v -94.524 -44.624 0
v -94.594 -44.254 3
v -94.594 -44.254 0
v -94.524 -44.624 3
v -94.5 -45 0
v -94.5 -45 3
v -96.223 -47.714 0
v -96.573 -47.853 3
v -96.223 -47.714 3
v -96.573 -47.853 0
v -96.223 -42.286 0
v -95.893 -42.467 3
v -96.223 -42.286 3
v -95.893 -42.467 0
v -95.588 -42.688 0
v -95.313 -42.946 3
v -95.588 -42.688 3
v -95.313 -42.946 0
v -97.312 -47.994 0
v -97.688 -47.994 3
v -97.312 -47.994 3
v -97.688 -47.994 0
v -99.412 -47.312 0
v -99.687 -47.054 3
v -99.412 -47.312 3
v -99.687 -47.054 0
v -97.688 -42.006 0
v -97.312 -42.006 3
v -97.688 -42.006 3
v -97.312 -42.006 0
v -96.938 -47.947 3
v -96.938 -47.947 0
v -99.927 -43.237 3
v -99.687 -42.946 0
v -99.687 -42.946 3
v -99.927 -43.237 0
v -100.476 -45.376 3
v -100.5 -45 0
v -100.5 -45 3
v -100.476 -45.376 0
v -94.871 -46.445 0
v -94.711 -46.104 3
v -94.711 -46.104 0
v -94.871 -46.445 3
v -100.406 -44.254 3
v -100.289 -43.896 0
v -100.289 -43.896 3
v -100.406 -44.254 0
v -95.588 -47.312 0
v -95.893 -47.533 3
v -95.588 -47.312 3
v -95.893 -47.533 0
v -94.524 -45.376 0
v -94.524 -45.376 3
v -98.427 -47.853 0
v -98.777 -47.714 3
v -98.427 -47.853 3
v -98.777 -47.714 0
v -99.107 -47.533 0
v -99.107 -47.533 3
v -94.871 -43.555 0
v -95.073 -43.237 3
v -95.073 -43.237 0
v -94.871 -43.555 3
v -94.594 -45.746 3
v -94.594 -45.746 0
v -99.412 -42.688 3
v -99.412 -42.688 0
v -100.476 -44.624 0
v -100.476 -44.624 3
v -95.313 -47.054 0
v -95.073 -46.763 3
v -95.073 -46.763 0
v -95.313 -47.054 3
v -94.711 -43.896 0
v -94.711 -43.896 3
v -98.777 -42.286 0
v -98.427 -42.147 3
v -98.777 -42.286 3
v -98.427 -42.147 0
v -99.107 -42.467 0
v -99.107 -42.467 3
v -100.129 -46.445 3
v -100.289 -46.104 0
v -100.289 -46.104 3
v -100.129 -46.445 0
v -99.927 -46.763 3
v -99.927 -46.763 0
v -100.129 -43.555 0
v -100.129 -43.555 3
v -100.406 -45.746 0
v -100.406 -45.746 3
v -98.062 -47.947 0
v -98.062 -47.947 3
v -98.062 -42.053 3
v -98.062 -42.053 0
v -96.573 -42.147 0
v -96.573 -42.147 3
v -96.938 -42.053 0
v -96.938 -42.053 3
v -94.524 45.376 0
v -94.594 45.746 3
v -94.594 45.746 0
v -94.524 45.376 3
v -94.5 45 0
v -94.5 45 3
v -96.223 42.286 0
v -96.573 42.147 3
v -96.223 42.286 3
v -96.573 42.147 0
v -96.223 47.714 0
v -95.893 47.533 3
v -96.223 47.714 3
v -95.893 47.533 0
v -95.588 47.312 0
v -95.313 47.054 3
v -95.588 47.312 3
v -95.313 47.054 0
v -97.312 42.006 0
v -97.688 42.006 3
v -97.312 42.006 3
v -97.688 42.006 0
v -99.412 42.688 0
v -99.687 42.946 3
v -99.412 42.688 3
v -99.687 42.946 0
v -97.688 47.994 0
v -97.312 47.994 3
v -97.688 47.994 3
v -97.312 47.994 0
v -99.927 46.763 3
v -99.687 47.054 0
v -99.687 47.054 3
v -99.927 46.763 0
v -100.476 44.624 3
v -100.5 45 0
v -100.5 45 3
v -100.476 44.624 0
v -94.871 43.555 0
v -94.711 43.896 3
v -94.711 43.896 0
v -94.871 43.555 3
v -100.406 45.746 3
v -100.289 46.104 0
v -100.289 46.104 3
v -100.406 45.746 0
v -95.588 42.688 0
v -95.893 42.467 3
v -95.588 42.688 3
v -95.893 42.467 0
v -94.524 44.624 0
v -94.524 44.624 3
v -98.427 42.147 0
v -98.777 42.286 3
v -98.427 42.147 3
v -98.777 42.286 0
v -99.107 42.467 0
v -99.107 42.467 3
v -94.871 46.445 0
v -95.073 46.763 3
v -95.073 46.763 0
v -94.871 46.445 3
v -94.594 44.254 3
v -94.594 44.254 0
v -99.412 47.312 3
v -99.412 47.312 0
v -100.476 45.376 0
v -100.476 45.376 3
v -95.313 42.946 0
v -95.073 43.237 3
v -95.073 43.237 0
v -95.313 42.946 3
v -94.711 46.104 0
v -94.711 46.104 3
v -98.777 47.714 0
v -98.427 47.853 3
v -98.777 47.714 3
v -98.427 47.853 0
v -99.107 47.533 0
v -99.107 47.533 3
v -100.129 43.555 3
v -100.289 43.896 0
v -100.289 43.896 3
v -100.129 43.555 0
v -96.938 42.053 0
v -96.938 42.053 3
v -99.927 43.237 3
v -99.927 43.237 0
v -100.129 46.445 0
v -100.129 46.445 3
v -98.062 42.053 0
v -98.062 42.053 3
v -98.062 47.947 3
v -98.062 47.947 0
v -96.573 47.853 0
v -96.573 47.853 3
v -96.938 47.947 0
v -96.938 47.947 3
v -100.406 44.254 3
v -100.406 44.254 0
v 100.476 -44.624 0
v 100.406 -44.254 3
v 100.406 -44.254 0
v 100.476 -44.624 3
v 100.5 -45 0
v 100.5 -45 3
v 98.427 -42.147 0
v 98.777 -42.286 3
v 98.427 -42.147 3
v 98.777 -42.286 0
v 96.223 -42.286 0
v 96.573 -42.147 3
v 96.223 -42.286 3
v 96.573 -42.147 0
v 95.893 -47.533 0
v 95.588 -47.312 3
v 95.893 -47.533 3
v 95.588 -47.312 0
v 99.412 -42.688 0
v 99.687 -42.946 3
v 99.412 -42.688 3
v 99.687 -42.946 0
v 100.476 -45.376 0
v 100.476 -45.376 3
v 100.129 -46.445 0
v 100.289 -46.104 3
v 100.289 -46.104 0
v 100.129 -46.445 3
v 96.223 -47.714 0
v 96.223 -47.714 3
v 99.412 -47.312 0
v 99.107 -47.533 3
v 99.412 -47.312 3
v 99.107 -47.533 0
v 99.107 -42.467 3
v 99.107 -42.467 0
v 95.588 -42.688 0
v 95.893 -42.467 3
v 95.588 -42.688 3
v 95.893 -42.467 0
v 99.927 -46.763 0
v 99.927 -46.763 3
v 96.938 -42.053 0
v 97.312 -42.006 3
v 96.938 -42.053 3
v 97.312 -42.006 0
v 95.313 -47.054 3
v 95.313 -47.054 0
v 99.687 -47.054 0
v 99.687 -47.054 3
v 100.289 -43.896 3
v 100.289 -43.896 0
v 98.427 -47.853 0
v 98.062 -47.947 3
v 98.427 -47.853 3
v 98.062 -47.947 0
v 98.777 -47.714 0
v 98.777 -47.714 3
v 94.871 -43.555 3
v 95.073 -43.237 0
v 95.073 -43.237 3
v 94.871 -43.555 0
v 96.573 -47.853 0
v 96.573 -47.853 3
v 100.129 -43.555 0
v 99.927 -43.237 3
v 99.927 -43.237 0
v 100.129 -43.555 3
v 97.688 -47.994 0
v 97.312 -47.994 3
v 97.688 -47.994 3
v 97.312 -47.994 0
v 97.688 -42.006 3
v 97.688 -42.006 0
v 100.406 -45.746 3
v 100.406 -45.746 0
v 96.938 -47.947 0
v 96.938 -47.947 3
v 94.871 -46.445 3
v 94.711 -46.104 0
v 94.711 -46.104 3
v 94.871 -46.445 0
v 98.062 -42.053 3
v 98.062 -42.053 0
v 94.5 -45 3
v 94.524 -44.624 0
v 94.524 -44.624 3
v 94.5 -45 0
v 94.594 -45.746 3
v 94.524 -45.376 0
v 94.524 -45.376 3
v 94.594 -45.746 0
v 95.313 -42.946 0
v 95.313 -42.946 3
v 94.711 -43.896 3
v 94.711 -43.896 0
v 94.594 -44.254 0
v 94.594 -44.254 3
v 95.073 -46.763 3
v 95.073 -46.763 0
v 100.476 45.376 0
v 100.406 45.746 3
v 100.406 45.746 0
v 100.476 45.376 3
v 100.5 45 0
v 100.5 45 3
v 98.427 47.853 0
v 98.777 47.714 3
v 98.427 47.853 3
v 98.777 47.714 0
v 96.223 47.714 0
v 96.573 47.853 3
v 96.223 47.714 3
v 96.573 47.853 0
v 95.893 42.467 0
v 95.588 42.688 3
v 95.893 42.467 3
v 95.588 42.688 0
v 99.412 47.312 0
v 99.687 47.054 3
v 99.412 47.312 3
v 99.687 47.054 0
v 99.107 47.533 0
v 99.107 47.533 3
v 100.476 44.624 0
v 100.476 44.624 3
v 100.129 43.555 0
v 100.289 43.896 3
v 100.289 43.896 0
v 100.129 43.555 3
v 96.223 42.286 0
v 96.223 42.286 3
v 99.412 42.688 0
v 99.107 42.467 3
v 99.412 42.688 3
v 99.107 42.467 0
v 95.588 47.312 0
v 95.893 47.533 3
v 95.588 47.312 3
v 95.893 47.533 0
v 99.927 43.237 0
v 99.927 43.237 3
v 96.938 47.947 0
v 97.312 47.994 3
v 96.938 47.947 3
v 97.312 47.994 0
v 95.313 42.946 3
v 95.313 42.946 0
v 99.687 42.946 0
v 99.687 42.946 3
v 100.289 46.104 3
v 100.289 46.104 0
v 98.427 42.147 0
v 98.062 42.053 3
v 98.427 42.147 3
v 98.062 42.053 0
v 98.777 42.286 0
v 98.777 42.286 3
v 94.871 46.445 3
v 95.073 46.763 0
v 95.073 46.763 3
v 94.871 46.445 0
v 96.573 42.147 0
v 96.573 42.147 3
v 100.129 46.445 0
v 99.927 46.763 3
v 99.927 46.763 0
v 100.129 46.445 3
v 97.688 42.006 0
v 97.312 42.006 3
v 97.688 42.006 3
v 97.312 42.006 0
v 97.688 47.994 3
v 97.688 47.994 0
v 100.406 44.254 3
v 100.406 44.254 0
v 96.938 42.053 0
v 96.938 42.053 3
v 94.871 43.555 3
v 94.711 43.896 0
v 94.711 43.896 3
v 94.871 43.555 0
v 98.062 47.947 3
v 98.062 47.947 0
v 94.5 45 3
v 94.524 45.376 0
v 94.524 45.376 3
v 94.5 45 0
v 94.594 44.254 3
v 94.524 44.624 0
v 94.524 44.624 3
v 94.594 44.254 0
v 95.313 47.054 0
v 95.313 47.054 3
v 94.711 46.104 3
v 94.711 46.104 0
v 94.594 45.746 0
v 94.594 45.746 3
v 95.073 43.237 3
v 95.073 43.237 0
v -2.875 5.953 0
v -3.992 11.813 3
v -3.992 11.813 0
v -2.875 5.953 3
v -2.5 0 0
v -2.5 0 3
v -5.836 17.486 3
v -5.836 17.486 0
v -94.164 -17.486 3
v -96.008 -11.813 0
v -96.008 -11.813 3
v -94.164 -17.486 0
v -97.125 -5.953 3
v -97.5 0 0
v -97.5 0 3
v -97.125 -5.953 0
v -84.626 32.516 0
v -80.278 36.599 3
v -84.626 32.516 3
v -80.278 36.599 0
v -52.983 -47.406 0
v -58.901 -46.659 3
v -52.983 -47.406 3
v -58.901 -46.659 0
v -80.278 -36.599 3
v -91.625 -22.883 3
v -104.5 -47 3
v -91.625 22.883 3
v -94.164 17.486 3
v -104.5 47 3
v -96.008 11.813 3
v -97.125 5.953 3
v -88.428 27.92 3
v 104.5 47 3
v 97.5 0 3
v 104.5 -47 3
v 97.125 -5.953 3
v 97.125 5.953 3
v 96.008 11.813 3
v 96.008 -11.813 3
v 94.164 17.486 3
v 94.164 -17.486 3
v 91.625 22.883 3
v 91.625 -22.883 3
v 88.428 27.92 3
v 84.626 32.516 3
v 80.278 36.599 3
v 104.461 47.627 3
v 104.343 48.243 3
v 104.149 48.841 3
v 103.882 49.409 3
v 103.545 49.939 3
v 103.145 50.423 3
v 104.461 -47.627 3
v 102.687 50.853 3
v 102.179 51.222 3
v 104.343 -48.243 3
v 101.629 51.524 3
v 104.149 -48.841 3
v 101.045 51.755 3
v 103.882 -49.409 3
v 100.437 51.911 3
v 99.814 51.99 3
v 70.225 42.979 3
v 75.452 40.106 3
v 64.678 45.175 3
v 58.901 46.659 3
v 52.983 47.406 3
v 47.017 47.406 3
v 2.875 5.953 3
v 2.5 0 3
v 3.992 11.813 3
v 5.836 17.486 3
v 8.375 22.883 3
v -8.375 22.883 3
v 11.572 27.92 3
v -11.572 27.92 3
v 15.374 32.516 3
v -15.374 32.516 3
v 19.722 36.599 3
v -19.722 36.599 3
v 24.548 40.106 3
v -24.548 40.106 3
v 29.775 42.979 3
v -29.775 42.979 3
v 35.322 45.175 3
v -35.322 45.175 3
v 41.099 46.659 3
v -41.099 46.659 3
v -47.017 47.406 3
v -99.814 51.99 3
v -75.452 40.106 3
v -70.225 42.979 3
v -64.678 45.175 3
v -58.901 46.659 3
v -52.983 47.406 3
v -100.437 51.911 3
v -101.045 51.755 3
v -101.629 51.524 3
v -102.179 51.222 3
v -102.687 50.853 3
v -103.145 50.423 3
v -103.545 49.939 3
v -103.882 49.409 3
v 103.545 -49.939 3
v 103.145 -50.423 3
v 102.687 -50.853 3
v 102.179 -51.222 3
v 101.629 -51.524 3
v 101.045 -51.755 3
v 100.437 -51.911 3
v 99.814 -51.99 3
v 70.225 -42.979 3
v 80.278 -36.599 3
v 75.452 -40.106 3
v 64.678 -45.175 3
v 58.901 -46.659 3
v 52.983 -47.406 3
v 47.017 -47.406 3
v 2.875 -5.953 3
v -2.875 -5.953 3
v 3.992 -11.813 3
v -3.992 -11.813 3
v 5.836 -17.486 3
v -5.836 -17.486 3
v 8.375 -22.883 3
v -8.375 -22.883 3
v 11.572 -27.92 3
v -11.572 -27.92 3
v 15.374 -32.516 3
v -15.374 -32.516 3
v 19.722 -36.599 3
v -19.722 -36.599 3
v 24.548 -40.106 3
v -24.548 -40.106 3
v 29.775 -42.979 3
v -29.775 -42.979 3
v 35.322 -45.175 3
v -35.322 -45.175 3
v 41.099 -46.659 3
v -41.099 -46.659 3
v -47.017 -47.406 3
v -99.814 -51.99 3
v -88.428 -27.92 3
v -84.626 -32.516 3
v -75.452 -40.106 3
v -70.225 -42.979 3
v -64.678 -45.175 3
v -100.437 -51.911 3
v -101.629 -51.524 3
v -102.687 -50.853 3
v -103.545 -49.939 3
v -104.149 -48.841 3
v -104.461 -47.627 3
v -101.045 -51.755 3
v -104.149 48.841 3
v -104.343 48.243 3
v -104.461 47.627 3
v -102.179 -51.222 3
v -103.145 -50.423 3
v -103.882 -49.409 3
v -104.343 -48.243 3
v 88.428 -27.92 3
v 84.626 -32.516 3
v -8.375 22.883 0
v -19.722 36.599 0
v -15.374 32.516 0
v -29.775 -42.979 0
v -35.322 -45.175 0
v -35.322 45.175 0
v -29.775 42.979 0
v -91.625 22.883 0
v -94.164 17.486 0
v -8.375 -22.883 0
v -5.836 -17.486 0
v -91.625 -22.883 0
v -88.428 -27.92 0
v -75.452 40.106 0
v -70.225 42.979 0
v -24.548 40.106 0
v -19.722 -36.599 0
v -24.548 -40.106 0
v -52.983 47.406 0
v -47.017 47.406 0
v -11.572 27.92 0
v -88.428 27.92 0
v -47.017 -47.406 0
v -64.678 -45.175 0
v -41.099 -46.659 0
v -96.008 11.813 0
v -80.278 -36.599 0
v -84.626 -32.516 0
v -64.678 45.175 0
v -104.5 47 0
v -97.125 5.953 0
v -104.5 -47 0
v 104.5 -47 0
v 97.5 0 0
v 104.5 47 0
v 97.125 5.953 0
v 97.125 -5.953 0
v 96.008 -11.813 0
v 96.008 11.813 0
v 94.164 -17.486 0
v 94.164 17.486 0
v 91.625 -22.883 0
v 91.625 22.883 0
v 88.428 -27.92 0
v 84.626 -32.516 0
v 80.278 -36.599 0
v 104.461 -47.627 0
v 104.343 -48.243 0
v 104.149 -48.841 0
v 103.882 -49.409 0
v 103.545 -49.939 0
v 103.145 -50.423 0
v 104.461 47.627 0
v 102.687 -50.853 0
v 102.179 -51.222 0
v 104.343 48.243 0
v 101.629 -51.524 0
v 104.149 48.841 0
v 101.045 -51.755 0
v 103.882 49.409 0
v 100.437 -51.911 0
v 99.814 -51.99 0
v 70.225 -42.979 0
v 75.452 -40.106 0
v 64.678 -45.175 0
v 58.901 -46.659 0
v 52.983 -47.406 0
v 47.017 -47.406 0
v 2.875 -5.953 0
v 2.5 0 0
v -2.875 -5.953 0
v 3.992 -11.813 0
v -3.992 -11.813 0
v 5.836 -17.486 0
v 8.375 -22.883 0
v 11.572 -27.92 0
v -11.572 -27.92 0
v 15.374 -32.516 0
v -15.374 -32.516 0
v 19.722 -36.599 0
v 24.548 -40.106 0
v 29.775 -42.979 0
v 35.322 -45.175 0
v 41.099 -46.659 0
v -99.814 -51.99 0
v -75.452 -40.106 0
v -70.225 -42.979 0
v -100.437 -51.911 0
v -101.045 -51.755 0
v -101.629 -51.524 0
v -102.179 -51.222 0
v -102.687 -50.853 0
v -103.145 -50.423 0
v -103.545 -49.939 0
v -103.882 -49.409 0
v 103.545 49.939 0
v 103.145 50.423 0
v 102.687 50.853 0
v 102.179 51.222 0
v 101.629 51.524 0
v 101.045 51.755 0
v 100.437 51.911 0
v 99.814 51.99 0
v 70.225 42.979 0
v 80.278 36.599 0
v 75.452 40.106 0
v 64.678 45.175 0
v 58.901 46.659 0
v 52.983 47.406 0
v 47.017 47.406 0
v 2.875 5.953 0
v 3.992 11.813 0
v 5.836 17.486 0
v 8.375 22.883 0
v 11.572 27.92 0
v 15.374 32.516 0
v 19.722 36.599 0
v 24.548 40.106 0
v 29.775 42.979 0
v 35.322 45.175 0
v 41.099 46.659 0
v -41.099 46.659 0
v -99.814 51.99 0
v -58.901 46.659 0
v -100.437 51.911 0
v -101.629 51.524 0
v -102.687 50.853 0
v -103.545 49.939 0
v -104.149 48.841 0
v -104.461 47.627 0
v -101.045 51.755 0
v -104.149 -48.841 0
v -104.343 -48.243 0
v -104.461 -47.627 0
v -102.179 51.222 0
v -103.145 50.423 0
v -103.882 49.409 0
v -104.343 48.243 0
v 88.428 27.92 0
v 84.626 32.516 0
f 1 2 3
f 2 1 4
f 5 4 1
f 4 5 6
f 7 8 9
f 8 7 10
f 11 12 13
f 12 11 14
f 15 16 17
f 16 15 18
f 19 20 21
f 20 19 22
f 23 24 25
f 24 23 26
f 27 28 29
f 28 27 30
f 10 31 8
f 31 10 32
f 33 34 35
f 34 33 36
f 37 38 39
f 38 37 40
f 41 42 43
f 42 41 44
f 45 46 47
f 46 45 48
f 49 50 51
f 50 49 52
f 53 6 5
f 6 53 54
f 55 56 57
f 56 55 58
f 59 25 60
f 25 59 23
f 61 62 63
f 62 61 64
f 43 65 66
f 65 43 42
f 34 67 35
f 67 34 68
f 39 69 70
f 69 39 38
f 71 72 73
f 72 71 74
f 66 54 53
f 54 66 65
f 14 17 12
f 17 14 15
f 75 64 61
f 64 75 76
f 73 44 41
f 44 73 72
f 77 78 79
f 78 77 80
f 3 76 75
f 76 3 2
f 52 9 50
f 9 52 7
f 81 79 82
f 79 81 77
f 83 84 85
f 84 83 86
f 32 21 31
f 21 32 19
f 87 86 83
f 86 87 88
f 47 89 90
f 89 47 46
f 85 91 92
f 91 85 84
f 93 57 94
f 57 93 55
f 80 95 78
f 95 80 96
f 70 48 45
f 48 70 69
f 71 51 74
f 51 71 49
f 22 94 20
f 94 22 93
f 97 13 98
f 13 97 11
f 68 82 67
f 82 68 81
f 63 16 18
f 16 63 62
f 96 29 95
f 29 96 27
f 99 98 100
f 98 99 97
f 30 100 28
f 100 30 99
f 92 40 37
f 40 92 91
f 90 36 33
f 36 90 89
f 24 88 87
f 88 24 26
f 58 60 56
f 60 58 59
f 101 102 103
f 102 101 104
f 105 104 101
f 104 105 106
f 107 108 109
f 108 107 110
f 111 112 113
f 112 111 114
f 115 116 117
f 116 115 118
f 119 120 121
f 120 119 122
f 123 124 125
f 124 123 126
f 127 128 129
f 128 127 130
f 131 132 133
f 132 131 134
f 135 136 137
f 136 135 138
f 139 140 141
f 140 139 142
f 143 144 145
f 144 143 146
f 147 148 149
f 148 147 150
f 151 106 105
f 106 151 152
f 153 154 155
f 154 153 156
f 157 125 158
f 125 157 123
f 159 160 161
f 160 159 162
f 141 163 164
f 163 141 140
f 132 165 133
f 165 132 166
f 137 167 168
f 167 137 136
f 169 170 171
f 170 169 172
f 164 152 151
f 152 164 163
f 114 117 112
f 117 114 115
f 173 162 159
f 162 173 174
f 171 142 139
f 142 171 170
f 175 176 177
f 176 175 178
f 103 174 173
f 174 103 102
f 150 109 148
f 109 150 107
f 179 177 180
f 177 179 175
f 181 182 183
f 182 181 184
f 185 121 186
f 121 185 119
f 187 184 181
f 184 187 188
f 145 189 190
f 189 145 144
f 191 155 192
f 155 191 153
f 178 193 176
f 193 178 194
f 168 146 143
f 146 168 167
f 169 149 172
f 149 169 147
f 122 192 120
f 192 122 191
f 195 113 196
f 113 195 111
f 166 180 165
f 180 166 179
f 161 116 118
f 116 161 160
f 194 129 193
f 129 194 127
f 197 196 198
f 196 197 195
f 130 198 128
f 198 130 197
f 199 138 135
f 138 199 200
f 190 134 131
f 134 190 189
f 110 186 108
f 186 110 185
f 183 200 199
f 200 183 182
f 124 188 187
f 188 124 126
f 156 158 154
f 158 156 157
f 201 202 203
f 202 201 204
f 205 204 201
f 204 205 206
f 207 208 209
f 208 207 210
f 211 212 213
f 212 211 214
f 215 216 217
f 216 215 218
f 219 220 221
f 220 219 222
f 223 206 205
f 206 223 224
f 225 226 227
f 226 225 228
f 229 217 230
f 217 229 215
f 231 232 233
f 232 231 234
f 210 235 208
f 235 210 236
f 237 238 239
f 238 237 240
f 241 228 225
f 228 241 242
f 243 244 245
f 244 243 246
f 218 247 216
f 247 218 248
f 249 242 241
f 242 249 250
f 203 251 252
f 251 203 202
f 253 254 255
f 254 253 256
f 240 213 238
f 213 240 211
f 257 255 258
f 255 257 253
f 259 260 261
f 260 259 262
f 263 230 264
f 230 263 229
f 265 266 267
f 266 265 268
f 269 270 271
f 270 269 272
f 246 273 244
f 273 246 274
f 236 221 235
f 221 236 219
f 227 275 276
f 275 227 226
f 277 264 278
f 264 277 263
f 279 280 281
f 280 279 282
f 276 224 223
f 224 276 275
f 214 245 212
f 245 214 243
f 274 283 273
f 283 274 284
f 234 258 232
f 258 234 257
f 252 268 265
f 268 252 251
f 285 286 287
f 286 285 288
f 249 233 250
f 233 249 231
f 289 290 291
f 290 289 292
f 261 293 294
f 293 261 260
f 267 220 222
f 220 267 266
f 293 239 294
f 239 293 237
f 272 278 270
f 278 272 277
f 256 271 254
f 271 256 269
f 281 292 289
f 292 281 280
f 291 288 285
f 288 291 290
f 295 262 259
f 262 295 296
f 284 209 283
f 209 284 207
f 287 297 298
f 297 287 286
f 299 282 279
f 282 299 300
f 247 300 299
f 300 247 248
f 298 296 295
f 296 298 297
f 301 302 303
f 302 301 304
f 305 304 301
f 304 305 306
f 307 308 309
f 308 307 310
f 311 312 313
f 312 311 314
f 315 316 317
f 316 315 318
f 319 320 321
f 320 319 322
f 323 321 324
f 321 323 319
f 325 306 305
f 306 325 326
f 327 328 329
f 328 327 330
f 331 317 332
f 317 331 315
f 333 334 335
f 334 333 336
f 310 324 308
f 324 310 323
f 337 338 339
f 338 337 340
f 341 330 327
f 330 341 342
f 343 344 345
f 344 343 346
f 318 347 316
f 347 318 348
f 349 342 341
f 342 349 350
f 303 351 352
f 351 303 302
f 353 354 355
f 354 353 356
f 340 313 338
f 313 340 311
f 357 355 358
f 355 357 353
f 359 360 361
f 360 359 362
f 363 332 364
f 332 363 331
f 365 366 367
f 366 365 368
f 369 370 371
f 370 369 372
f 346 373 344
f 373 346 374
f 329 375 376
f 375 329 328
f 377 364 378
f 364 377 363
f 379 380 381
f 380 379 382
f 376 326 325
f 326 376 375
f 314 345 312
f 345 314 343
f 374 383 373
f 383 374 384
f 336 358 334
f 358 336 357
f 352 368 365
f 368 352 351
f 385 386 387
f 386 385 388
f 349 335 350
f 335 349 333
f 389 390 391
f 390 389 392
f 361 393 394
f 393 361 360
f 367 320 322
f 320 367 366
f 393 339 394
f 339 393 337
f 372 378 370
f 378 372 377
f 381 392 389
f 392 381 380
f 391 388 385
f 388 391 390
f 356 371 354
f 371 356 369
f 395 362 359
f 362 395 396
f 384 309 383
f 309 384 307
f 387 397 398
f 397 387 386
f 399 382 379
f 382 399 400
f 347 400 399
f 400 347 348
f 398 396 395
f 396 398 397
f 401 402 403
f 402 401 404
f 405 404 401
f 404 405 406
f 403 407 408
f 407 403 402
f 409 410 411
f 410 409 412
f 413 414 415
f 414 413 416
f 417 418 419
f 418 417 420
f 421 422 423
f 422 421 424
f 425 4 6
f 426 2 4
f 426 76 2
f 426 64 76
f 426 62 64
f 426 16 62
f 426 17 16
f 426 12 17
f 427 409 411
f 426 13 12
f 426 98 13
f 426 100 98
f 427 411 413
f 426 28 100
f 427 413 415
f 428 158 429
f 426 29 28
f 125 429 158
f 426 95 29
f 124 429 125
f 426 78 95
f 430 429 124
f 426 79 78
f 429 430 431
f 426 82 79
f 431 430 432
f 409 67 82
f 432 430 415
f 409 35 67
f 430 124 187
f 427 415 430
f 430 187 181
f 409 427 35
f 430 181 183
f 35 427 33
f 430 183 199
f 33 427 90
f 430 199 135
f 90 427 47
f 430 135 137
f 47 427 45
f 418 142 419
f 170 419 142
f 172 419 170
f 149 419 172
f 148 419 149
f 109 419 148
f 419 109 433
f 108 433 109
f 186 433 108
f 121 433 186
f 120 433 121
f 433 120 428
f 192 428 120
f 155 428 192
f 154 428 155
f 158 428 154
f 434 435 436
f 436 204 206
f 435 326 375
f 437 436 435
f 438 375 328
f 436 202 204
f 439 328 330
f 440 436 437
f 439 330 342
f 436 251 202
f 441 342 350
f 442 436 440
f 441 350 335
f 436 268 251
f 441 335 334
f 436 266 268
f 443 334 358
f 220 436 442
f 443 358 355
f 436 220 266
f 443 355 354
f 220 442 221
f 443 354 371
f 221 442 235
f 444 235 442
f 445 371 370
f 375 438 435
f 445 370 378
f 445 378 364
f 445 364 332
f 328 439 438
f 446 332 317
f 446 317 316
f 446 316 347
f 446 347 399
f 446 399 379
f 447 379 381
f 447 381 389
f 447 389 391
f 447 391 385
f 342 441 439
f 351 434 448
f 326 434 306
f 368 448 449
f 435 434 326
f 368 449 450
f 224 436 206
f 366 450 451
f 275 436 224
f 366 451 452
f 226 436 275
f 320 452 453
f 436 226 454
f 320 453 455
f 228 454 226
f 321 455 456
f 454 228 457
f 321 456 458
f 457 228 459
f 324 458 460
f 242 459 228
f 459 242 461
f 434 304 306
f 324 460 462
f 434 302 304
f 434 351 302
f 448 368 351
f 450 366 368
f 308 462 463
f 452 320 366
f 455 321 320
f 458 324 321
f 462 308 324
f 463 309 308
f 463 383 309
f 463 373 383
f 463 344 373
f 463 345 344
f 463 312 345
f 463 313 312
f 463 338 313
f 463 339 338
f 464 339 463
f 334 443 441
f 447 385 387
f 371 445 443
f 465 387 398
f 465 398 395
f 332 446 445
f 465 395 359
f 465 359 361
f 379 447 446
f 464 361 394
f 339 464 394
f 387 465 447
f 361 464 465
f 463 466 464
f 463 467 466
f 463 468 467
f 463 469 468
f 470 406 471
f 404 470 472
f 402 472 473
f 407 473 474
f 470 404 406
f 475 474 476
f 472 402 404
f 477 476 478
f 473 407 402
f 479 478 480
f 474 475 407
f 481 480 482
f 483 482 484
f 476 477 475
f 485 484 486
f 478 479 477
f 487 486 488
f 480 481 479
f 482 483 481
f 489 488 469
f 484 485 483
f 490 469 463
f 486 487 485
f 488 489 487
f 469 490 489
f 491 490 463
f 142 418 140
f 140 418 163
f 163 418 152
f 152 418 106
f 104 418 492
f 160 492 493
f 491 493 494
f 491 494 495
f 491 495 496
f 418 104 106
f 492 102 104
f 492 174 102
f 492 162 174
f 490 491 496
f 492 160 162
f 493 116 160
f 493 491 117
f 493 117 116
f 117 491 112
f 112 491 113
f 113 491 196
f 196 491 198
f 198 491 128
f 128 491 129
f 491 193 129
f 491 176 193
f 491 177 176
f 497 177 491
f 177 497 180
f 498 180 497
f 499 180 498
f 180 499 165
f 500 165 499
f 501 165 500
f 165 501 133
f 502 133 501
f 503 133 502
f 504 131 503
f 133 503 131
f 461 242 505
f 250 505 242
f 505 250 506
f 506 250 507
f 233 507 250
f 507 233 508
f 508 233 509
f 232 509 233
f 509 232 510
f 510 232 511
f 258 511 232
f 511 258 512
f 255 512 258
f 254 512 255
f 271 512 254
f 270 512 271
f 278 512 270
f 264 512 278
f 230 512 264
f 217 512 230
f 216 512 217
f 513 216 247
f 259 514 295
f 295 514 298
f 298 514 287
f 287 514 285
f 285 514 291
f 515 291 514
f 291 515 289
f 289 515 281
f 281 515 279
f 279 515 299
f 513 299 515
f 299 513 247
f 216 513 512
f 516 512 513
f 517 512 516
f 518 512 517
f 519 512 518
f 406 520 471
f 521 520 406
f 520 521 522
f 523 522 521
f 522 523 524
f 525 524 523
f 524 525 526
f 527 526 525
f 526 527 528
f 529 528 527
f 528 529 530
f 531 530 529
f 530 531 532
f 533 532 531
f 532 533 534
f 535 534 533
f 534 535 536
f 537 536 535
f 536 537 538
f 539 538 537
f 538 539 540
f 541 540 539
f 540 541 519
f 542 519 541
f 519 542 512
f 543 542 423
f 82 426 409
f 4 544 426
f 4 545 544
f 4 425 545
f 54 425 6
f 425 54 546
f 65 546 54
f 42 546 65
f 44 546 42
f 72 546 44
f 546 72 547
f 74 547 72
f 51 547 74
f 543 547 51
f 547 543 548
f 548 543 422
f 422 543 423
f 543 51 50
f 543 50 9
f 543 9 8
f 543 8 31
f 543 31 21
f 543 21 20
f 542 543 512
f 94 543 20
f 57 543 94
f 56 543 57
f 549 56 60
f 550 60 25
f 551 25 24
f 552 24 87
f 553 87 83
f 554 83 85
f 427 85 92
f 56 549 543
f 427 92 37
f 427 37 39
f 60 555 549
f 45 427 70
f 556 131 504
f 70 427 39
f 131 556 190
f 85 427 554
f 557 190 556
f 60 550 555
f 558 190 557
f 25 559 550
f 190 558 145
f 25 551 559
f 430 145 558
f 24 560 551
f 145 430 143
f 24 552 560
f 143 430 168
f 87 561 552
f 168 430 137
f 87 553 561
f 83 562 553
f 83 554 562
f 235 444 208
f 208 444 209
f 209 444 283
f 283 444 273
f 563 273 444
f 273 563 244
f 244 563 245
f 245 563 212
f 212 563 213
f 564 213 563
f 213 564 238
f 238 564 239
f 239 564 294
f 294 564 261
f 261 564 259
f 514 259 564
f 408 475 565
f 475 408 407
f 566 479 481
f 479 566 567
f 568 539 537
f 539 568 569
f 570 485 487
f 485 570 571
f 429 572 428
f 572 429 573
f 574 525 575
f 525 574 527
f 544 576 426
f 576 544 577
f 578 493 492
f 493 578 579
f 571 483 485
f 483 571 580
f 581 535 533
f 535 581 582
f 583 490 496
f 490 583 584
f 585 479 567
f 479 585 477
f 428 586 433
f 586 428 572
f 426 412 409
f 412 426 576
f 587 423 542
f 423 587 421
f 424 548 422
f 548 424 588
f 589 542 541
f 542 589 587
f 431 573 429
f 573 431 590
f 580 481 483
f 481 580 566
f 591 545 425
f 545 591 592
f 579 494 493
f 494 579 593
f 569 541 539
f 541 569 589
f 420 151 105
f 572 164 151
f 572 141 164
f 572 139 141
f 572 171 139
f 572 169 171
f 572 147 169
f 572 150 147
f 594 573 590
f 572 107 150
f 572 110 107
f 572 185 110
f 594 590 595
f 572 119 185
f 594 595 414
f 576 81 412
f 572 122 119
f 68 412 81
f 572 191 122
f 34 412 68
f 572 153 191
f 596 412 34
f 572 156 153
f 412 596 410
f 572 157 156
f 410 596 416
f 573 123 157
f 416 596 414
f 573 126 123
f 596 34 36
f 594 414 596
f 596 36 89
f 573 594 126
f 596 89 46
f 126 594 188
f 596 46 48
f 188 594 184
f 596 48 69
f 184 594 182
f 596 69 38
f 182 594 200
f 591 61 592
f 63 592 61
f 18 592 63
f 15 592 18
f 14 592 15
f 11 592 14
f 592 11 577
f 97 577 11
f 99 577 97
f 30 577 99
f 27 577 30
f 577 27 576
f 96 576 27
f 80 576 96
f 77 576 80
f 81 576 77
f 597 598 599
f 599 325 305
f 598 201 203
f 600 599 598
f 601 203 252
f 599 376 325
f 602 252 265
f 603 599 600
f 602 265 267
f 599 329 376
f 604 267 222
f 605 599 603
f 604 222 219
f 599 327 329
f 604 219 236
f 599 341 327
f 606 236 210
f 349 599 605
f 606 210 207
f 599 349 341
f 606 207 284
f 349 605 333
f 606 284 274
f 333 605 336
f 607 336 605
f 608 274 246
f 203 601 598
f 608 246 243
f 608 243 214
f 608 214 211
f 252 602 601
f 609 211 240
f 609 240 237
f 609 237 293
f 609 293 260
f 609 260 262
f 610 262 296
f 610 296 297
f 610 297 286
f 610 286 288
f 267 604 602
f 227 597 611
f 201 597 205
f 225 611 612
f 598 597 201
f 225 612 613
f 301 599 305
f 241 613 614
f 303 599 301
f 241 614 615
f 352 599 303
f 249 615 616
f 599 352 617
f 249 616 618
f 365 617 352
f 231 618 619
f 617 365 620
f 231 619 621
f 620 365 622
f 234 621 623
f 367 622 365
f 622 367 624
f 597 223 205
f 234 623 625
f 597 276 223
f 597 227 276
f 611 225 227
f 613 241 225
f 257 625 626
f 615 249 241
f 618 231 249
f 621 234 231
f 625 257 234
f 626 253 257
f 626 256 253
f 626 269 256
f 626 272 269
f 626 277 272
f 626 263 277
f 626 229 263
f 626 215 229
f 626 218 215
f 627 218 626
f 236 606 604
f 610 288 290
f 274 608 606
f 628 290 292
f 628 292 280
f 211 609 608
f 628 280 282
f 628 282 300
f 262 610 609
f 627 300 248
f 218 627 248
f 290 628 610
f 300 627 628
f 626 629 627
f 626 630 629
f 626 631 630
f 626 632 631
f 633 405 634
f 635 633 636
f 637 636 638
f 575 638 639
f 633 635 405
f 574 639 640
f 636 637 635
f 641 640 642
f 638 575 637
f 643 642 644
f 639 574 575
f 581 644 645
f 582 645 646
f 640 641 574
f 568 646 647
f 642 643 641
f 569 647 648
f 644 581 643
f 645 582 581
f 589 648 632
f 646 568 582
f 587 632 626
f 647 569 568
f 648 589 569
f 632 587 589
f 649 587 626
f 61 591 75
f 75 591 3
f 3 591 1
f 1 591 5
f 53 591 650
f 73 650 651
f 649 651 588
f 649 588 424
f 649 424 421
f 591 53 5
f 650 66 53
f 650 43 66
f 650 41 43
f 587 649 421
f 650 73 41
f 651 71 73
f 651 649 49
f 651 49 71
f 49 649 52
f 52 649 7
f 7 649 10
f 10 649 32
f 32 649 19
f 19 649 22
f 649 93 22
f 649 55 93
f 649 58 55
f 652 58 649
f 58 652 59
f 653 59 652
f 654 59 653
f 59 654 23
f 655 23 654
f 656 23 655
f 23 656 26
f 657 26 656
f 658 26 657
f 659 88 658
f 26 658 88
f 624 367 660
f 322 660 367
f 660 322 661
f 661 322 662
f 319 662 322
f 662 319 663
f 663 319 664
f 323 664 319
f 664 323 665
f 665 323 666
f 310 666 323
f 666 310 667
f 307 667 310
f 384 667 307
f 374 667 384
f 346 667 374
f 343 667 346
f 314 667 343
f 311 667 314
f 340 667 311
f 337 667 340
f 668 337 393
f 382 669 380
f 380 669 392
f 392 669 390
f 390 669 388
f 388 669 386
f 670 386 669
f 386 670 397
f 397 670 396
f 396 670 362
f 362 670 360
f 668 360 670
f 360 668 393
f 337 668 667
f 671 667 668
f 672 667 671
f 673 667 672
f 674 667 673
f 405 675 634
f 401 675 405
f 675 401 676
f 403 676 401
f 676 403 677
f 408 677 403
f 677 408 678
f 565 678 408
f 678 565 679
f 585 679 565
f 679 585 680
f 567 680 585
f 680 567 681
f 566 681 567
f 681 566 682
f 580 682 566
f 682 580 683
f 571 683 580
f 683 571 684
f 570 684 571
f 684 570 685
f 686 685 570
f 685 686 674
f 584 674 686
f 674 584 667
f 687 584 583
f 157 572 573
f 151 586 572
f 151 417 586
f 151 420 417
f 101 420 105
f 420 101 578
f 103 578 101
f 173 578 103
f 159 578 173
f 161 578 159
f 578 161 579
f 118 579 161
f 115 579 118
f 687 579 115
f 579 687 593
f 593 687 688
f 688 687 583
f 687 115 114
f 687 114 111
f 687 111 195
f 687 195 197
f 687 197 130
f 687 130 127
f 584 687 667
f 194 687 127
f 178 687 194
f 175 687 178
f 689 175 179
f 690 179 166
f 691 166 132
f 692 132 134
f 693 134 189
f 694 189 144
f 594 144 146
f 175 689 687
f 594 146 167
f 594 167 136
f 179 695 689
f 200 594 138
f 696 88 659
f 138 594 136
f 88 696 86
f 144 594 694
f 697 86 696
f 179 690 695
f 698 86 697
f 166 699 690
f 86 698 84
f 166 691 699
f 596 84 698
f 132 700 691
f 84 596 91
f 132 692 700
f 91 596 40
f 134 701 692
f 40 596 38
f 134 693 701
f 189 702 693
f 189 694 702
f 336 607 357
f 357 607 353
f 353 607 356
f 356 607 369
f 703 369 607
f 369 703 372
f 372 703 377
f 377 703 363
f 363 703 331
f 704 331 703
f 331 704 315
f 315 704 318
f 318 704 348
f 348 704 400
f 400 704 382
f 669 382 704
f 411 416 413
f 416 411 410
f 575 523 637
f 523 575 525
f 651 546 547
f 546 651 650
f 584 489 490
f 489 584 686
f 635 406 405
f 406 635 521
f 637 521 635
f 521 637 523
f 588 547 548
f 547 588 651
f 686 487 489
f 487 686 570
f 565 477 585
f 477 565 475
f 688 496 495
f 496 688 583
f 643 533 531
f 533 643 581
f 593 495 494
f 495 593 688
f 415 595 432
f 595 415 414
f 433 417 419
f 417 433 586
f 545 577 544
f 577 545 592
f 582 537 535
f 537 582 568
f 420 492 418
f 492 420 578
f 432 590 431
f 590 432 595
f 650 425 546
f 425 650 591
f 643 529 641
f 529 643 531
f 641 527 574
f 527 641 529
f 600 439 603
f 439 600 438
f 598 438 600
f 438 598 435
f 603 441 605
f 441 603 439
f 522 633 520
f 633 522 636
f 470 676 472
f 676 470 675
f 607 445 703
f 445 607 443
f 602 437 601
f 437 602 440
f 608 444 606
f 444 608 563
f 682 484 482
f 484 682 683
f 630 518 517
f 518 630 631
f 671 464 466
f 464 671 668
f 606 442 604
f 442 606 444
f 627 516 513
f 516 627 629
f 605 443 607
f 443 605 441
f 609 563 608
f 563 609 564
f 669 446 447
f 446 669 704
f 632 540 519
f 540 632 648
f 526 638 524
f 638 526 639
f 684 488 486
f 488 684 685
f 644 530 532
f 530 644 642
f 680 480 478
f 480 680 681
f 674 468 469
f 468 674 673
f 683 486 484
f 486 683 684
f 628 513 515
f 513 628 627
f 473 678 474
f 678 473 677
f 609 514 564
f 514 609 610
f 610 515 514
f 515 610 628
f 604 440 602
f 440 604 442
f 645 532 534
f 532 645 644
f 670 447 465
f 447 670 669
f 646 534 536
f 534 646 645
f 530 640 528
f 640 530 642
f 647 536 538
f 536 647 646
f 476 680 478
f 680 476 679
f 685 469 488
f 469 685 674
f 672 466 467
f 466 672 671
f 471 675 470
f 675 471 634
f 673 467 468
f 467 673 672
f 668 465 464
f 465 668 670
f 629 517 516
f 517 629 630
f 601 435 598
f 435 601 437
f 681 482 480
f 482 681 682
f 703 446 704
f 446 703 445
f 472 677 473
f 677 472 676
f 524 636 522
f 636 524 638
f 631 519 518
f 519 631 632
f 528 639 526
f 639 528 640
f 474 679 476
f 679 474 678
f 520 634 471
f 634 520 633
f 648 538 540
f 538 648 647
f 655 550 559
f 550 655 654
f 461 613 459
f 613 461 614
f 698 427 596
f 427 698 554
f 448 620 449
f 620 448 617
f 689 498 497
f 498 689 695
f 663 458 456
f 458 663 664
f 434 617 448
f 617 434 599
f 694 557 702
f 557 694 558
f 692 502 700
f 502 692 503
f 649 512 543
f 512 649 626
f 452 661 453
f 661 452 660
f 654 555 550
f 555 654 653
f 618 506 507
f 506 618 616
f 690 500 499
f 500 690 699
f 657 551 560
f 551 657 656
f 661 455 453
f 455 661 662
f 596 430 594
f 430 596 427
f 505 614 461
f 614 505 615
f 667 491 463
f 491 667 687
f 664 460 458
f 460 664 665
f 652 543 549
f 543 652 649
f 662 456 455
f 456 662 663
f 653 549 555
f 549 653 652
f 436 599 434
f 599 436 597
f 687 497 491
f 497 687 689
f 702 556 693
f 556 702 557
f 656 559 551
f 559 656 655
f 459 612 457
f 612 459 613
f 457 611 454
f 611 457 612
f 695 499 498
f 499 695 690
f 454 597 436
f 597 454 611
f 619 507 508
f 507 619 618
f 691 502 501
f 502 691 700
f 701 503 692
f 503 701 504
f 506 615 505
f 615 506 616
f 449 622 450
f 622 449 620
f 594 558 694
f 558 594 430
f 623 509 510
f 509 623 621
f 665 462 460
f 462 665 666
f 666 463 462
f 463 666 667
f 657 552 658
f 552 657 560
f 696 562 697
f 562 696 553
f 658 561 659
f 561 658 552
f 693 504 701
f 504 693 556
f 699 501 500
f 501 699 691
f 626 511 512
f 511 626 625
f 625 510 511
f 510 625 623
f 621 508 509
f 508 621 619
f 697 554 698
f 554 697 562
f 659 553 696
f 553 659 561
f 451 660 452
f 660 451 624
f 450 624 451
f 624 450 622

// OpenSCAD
$fn = 50;


difference() {
	union() {
		hull() {
			translate(v = [-99.5000000000, 47.0000000000, 0]) {
				cylinder(h = 3, r = 5);
			}
			translate(v = [99.5000000000, 47.0000000000, 0]) {
				cylinder(h = 3, r = 5);
			}
			translate(v = [-99.5000000000, -47.0000000000, 0]) {
				cylinder(h = 3, r = 5);
			}
			translate(v = [99.5000000000, -47.0000000000, 0]) {
				cylinder(h = 3, r = 5);
			}
		}
	}
	union() {
		#translate(v = [-97.5000000000, -45.0000000000, -100.0000000000]) {
			cylinder(h = 200, r = 3.0000000000);
		}
		#translate(v = [-97.5000000000, 45.0000000000, -100.0000000000]) {
			cylinder(h = 200, r = 3.0000000000);
		}
		#translate(v = [97.5000000000, -45.0000000000, -100.0000000000]) {
			cylinder(h = 200, r = 3.0000000000);
		}
		#translate(v = [97.5000000000, 45.0000000000, -100.0000000000]) {
			cylinder(h = 200, r = 3.0000000000);
		}
		#translate(v = [-50.0000000000, 0, 0]) {
			cylinder(h = 3, r = 47.5000000000);
		}
		#translate(v = [50.0000000000, 0, 0]) {
			cylinder(h = 3, r = 47.5000000000);
		}
	}
}
